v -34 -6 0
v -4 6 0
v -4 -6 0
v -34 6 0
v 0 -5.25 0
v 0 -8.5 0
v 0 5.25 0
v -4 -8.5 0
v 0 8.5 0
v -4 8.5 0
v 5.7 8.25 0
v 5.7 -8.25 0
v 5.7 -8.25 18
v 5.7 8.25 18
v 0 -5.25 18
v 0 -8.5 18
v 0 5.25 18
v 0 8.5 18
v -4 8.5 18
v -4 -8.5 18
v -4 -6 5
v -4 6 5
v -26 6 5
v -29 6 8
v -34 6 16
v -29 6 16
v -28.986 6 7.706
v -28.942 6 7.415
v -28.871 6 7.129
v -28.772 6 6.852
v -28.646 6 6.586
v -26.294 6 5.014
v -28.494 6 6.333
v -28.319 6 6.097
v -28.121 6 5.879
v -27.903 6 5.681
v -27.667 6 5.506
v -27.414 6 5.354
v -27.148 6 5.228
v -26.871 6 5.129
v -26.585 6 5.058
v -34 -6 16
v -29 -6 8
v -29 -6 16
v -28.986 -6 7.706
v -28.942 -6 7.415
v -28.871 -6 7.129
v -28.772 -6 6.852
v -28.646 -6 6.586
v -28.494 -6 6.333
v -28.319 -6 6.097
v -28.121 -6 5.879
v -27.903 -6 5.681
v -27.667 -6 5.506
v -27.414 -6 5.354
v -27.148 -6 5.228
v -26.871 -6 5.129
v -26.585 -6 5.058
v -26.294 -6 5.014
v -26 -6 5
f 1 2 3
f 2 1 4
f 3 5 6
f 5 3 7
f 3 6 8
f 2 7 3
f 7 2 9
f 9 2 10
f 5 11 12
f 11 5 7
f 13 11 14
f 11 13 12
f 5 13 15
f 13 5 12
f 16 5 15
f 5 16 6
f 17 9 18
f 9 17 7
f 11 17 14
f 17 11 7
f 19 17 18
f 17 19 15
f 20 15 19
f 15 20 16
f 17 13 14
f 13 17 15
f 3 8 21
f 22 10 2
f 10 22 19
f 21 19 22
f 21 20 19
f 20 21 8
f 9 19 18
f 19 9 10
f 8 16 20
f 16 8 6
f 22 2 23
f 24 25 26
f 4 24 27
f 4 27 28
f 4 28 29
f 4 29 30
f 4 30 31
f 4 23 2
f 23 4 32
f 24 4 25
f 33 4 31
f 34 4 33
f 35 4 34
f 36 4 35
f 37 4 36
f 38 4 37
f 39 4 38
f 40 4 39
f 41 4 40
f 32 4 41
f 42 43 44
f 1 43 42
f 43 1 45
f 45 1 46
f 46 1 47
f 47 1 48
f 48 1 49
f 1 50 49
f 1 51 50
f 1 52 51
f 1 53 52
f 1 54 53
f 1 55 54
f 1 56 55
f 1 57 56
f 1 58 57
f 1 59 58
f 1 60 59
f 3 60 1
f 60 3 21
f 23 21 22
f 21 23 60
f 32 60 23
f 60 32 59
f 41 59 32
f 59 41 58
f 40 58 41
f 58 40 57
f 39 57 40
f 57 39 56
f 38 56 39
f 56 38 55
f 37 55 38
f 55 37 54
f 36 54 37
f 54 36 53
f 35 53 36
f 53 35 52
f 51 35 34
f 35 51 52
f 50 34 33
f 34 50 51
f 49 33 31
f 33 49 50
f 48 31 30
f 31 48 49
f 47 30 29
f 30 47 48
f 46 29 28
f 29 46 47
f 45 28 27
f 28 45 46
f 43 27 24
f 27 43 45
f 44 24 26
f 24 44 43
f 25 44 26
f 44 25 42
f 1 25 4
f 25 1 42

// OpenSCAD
// file: stand_cable_clamp_common.scad
// stand_cable_clamp_common.scad — modular cable clamp for round stand poles.
//
// A split C-clamp pops over the pole and an M5 bolt + wingnut cinches it tight
// (the bolt head is captured in a hex pocket, so you only turn the wingnut —
// tool-free reposition). A dovetail on the clamp face takes slide-on cable
// heads, so one clamp accepts any attachment.
//
//   clamp(tube_d)   — the pole clamp (set tube_d to your pole OD)
//   head_hook()     — J-hook: arm out front, upturned lip
//   head_clip()     — snap cable clip
//   head_comb()     — multi-cable comb
//   head_velcro()   — velcro-strap slot
//
// On-Stage SS8800B+ measured diameters: upper shaft ≈ 34.9 mm (1⅜") / 38.1 mm
// (1½" w/ sleeve), tripod legs 35.38 mm, crank-up column 41.41 mm. Variant files
// clamp_leg.scad (35.38) and clamp_column.scad (41.41) cover the latter two.

TUBE_D = 35;        // pole outer diameter (set per stand)
CLEAR  = 0.6;       // clamp bore clearance
WALL   = 5;         // clamp wall
H      = 22;        // clamp height (along the pole)
GAP    = 4;         // split-gap width
EAR_L  = 18; EAR_W = 10;
BOLT_D = 5.4;       // M5 clearance
HEX_AF = 8.2;       // M5 hex head/nut across-flats (capture pocket)
HEX_T  = 4.5;

// dovetail (undercut: mouth narrower than back so the head can't pull out)
DT_MOUTH = 11; DT_BACK = 17; DT_DEPTH = 6; DT_H = 18; DT_STOP = 3; DT_CLEAR = 0.5;
CABLE_D = 8;        // nominal cable diameter for clip/comb

$fn = 64;

// dovetail solid: mouth (narrow) at x=0 facing -X, widening to back at x=depth, extruded up Z
module dt_prism(mouth, back, depth, h) {
    linear_extrude(h) polygon([[0, -mouth/2], [0, mouth/2], [depth, back/2], [depth, -back/2]]);
}
module dt_tongue() { dt_prism(DT_MOUTH - DT_CLEAR, DT_BACK - DT_CLEAR, DT_DEPTH - 0.3, DT_H); }

// ---- clamp ----
module clamp(tube_d = TUBE_D) {
    ir = tube_d / 2 + CLEAR; orr = ir + WALL;
    boss_x = -orr - DT_DEPTH - 2;        // -X outer face of the dovetail boss
    difference() {
        union() {
            cylinder(h = H, r = orr);
            translate([orr - 3, GAP / 2, 0]) cube([EAR_L, EAR_W, H]);            // +Y ear
            translate([orr - 3, -GAP / 2 - EAR_W, 0]) cube([EAR_L, EAR_W, H]);   // -Y ear
            translate([boss_x, -(DT_BACK / 2 + 4), 0]) cube([DT_DEPTH + 5, DT_BACK + 8, H]); // dovetail boss
        }
        translate([0, 0, 0]) cylinder(h = 3 * H, r = ir, center = true);         // bore
        translate([0, -GAP / 2, -1]) cube([orr + EAR_L + 5, GAP, H + 2]);        // split slot
        // wingnut bolt through the ears (along Y)
        translate([orr + EAR_L - 8, GAP / 2 + EAR_W + 3, H / 2]) rotate([90, 0, 0]) cylinder(h = 2 * EAR_W + GAP + 8, d = BOLT_D);
        // hex pocket captures the bolt head on the +Y ear outer face
        translate([orr + EAR_L - 8, GAP / 2 + EAR_W + HEX_T, H / 2]) rotate([90, 0, 0]) cylinder(h = HEX_T + 1, d = HEX_AF / cos(30), $fn = 6);
        // dovetail socket groove (open top, solid below DT_STOP as a slide stop)
        translate([boss_x, 0, DT_STOP]) dt_prism(DT_MOUTH, DT_BACK, DT_DEPTH, H);
    }
}

// ---- heads (universal; mount via the dovetail tongue at x=0..DT_DEPTH) ----
module _backplate(t = 4) { translate([-t, -DT_BACK / 2, 0]) cube([t, DT_BACK, DT_H]); }

// J-hook: a flat arm straight out from the backplate and an upturned lip at its
// end. Cables drape into the trough between the backplate and the lip.
//
// v1.1.0 had a 250° ring CENTRED ON THE BACKPLATE, so the ring looped round the
// mount itself: it joined the head only where it crossed the backplate, and it
// ran back past the tongue into the clamp body — 340 mm³ of interference, so the
// head could not slide into the dovetail at all. This profile lives entirely in
// front of the backplate (x < -4), so nothing reaches behind the mount.
//
// It prints dovetail-down like every head: the arm lies on the bed and every
// other face is vertical, so there is still nothing to support.
HOOK_OPEN = 25;   // trough width, backplate face to lip
HOOK_LIP  = 16;   // lip height from the bed
HOOK_T    = 5;    // arm and lip thickness
HOOK_W    = 12;   // across the hook (Y)
HOOK_FIL  = 3;    // fillet where the arm meets the lip, inside the trough

module _hook_profile() {
    x_lip = -(HOOK_OPEN + HOOK_T);
    // arm runs 1 mm INTO the backplate (x -4..0): a partial-area join, so it
    // overlaps volumetrically rather than butting on the backplate's face
    // grow then shrink: fills the concave corner with a HOOK_FIL radius and
    // leaves the 5 mm arm alone (shrink-then-grow would erase anything thinner
    // than 2 × HOOK_FIL — which the first cut of this did)
    offset(r = -HOOK_FIL) offset(delta = HOOK_FIL)
        union() {
            translate([x_lip, 0]) square([HOOK_OPEN + HOOK_T + 1, HOOK_T]);   // arm
            translate([x_lip, 0]) square([HOOK_T, HOOK_LIP]);                 // lip
        }
}

module head_hook() {
    dt_tongue(); _backplate();
    translate([-4, HOOK_W / 2, 0]) rotate([90, 0, 0])
        linear_extrude(HOOK_W) _hook_profile();
}
module head_clip(clip_w = 12) {
    dt_tongue(); _backplate();
    // C-clip (vertical cable), ring connects to the backplate on +X, mouth opens -X
    ring_out = CABLE_D + 5;
    translate([-4 - ring_out / 2 + 1.5, 0, (DT_H - clip_w) / 2])
        linear_extrude(clip_w) difference() {
            circle(d = ring_out);
            circle(d = CABLE_D + 0.7);
            translate([-ring_out, -(CABLE_D - 1.5) / 2]) square([ring_out, CABLE_D - 1.5]); // snap mouth (-X)
        }
}
module head_comb(n = 4) {
    dt_tongue(); _backplate();
    bar_w = n * (CABLE_D + 3) + 3;
    translate([-4 - 8, -bar_w / 2, 0]) difference() {
        cube([10, bar_w, DT_H]);
        for (i = [0 : n - 1]) translate([-1, 3 + i * (CABLE_D + 3) + CABLE_D / 2, DT_H]) rotate([0, 90, 0]) cylinder(d = CABLE_D, h = 12); // open-top slots
        for (i = [0 : n - 1]) translate([-1, 3 + i * (CABLE_D + 3) + CABLE_D / 2, DT_H - CABLE_D / 2]) cube([12, CABLE_D, CABLE_D]);
    }
}
module head_velcro(strap_w = 25, strap_t = 3) {
    dt_tongue(); _backplate();
    translate([-4 - 6, -(strap_w + 8) / 2, 0]) difference() {
        cube([6, strap_w + 8, DT_H]);
        translate([-1, 4, DT_H / 2 - strap_t / 2]) cube([8, strap_w, strap_t]); // strap thru-slot
    }
}
// main file
// head_hook — slide-on cable head (universal dovetail mount).
include <stand_cable_clamp_common.scad>
head_hook();
